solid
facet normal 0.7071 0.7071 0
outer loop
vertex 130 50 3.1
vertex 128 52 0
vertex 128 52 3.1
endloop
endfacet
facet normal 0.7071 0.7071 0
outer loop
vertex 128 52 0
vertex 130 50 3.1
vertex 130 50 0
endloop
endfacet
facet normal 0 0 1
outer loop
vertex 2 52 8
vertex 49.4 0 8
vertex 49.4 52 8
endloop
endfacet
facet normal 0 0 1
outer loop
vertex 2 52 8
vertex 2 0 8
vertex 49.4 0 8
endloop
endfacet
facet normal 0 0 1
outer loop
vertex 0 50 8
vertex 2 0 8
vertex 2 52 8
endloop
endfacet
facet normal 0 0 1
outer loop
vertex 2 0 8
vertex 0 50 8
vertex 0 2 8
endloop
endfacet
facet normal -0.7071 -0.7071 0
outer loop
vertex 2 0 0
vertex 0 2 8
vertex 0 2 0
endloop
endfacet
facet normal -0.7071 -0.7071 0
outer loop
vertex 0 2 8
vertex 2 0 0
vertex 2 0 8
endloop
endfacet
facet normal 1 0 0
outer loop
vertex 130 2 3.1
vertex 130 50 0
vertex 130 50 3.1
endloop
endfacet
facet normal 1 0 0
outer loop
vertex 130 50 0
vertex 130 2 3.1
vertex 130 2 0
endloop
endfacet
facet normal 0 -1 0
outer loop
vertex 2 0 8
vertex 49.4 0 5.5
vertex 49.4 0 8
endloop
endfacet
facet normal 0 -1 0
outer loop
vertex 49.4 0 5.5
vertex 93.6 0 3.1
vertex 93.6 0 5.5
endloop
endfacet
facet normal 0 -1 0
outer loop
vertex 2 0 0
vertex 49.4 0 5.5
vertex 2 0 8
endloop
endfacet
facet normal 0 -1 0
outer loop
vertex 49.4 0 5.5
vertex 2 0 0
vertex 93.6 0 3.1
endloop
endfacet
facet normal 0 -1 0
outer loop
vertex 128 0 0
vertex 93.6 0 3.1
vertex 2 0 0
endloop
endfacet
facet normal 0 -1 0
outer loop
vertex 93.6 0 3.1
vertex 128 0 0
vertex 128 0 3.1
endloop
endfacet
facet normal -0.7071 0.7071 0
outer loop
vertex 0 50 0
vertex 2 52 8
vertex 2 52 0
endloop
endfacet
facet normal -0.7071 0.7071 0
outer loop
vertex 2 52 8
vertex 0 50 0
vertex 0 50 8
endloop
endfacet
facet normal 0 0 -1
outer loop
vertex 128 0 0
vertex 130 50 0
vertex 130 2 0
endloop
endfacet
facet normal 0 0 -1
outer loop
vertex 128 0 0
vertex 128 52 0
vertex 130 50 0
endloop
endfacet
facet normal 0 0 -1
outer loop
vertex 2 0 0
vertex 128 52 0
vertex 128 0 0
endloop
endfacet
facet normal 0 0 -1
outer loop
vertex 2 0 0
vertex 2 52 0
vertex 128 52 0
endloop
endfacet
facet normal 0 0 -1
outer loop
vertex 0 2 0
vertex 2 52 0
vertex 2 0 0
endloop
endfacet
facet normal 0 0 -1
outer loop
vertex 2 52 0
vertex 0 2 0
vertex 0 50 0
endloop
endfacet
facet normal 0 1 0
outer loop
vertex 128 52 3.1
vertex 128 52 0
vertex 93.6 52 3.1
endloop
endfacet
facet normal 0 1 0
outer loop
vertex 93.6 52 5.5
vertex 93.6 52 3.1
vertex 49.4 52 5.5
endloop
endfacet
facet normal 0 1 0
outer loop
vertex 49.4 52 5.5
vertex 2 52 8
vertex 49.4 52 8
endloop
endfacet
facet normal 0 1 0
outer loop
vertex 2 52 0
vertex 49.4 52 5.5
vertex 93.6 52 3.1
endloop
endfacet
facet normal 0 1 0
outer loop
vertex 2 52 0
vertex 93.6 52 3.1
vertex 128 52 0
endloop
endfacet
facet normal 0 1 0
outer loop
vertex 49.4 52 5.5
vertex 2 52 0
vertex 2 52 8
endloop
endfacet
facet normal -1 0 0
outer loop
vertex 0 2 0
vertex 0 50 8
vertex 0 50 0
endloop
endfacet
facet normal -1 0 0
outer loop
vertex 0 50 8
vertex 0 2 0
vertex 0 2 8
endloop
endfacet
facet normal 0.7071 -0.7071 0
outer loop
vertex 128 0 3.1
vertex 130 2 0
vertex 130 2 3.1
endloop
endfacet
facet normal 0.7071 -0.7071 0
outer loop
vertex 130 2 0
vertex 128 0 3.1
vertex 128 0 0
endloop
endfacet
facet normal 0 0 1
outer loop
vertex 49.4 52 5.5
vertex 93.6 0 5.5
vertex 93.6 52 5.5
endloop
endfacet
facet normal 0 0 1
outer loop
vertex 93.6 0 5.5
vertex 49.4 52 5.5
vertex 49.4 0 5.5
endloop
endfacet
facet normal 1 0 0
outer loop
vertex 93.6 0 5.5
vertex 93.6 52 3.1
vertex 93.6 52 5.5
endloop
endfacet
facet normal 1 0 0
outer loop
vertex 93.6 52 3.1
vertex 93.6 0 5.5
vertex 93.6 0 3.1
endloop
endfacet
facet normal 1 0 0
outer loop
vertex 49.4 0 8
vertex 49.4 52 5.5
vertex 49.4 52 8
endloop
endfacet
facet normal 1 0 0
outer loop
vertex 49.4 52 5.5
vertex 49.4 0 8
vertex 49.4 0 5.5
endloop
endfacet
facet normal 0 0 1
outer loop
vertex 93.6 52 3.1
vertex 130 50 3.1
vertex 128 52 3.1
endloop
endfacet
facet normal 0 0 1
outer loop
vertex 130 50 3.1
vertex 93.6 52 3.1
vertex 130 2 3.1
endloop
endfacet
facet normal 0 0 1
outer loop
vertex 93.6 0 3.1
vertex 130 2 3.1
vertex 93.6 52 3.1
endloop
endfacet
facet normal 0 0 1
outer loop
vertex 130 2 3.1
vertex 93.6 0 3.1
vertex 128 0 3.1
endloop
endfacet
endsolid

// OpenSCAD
$fn = 32;

// ----------------------------------------------------------------------
// Stepped bar: twostep, 130 x 52 x 8/3.1 mm
// ----------------------------------------------------------------------

// --- parameters (mm) ---
bar_l = 130;              // bar length, X
bar_w = 52;               // bar width, Y
plate_t = 8;              // thickness of the thick zone, Z
thin_t = 3.1;             // thickness of the thin zone
corner_c = 2;             // corner chamfer of the bar
step_cut = 4.9;           // material removed from the thin zone
stair1_x = 49.4;          // position of the first stair
stair2_x = 93.6;          // position of the second stair
mid_t = 5.5;              // thickness of the middle zone
depth_1 = 2.5;            // depth of cut 1 from the top face
depth_2 = 4.9;            // depth of cut 2 from the top face

profile = [[2, 0], [128, 0], [130, 2], [130, 50], [128, 52], [2, 52], [0, 50], [0, 2]];  // primary outline, 8 points, counter clockwise
void_1 = [[49.4, -1], [93.6, -1], [93.6, 53], [49.4, 53]];  // first stair, 4 points
void_2 = [[93.6, -1], [131, -1], [131, 53], [93.6, 53]];  // second stair, 4 points

// --- the one profile operation ---
difference() {
  linear_extrude(height = plate_t) polygon(points = profile);
  translate([0, 0, plate_t - depth_1])
    linear_extrude(height = depth_1 + 1) polygon(points = void_1);
  translate([0, 0, plate_t - depth_2])
    linear_extrude(height = depth_2 + 1) polygon(points = void_2);
}
